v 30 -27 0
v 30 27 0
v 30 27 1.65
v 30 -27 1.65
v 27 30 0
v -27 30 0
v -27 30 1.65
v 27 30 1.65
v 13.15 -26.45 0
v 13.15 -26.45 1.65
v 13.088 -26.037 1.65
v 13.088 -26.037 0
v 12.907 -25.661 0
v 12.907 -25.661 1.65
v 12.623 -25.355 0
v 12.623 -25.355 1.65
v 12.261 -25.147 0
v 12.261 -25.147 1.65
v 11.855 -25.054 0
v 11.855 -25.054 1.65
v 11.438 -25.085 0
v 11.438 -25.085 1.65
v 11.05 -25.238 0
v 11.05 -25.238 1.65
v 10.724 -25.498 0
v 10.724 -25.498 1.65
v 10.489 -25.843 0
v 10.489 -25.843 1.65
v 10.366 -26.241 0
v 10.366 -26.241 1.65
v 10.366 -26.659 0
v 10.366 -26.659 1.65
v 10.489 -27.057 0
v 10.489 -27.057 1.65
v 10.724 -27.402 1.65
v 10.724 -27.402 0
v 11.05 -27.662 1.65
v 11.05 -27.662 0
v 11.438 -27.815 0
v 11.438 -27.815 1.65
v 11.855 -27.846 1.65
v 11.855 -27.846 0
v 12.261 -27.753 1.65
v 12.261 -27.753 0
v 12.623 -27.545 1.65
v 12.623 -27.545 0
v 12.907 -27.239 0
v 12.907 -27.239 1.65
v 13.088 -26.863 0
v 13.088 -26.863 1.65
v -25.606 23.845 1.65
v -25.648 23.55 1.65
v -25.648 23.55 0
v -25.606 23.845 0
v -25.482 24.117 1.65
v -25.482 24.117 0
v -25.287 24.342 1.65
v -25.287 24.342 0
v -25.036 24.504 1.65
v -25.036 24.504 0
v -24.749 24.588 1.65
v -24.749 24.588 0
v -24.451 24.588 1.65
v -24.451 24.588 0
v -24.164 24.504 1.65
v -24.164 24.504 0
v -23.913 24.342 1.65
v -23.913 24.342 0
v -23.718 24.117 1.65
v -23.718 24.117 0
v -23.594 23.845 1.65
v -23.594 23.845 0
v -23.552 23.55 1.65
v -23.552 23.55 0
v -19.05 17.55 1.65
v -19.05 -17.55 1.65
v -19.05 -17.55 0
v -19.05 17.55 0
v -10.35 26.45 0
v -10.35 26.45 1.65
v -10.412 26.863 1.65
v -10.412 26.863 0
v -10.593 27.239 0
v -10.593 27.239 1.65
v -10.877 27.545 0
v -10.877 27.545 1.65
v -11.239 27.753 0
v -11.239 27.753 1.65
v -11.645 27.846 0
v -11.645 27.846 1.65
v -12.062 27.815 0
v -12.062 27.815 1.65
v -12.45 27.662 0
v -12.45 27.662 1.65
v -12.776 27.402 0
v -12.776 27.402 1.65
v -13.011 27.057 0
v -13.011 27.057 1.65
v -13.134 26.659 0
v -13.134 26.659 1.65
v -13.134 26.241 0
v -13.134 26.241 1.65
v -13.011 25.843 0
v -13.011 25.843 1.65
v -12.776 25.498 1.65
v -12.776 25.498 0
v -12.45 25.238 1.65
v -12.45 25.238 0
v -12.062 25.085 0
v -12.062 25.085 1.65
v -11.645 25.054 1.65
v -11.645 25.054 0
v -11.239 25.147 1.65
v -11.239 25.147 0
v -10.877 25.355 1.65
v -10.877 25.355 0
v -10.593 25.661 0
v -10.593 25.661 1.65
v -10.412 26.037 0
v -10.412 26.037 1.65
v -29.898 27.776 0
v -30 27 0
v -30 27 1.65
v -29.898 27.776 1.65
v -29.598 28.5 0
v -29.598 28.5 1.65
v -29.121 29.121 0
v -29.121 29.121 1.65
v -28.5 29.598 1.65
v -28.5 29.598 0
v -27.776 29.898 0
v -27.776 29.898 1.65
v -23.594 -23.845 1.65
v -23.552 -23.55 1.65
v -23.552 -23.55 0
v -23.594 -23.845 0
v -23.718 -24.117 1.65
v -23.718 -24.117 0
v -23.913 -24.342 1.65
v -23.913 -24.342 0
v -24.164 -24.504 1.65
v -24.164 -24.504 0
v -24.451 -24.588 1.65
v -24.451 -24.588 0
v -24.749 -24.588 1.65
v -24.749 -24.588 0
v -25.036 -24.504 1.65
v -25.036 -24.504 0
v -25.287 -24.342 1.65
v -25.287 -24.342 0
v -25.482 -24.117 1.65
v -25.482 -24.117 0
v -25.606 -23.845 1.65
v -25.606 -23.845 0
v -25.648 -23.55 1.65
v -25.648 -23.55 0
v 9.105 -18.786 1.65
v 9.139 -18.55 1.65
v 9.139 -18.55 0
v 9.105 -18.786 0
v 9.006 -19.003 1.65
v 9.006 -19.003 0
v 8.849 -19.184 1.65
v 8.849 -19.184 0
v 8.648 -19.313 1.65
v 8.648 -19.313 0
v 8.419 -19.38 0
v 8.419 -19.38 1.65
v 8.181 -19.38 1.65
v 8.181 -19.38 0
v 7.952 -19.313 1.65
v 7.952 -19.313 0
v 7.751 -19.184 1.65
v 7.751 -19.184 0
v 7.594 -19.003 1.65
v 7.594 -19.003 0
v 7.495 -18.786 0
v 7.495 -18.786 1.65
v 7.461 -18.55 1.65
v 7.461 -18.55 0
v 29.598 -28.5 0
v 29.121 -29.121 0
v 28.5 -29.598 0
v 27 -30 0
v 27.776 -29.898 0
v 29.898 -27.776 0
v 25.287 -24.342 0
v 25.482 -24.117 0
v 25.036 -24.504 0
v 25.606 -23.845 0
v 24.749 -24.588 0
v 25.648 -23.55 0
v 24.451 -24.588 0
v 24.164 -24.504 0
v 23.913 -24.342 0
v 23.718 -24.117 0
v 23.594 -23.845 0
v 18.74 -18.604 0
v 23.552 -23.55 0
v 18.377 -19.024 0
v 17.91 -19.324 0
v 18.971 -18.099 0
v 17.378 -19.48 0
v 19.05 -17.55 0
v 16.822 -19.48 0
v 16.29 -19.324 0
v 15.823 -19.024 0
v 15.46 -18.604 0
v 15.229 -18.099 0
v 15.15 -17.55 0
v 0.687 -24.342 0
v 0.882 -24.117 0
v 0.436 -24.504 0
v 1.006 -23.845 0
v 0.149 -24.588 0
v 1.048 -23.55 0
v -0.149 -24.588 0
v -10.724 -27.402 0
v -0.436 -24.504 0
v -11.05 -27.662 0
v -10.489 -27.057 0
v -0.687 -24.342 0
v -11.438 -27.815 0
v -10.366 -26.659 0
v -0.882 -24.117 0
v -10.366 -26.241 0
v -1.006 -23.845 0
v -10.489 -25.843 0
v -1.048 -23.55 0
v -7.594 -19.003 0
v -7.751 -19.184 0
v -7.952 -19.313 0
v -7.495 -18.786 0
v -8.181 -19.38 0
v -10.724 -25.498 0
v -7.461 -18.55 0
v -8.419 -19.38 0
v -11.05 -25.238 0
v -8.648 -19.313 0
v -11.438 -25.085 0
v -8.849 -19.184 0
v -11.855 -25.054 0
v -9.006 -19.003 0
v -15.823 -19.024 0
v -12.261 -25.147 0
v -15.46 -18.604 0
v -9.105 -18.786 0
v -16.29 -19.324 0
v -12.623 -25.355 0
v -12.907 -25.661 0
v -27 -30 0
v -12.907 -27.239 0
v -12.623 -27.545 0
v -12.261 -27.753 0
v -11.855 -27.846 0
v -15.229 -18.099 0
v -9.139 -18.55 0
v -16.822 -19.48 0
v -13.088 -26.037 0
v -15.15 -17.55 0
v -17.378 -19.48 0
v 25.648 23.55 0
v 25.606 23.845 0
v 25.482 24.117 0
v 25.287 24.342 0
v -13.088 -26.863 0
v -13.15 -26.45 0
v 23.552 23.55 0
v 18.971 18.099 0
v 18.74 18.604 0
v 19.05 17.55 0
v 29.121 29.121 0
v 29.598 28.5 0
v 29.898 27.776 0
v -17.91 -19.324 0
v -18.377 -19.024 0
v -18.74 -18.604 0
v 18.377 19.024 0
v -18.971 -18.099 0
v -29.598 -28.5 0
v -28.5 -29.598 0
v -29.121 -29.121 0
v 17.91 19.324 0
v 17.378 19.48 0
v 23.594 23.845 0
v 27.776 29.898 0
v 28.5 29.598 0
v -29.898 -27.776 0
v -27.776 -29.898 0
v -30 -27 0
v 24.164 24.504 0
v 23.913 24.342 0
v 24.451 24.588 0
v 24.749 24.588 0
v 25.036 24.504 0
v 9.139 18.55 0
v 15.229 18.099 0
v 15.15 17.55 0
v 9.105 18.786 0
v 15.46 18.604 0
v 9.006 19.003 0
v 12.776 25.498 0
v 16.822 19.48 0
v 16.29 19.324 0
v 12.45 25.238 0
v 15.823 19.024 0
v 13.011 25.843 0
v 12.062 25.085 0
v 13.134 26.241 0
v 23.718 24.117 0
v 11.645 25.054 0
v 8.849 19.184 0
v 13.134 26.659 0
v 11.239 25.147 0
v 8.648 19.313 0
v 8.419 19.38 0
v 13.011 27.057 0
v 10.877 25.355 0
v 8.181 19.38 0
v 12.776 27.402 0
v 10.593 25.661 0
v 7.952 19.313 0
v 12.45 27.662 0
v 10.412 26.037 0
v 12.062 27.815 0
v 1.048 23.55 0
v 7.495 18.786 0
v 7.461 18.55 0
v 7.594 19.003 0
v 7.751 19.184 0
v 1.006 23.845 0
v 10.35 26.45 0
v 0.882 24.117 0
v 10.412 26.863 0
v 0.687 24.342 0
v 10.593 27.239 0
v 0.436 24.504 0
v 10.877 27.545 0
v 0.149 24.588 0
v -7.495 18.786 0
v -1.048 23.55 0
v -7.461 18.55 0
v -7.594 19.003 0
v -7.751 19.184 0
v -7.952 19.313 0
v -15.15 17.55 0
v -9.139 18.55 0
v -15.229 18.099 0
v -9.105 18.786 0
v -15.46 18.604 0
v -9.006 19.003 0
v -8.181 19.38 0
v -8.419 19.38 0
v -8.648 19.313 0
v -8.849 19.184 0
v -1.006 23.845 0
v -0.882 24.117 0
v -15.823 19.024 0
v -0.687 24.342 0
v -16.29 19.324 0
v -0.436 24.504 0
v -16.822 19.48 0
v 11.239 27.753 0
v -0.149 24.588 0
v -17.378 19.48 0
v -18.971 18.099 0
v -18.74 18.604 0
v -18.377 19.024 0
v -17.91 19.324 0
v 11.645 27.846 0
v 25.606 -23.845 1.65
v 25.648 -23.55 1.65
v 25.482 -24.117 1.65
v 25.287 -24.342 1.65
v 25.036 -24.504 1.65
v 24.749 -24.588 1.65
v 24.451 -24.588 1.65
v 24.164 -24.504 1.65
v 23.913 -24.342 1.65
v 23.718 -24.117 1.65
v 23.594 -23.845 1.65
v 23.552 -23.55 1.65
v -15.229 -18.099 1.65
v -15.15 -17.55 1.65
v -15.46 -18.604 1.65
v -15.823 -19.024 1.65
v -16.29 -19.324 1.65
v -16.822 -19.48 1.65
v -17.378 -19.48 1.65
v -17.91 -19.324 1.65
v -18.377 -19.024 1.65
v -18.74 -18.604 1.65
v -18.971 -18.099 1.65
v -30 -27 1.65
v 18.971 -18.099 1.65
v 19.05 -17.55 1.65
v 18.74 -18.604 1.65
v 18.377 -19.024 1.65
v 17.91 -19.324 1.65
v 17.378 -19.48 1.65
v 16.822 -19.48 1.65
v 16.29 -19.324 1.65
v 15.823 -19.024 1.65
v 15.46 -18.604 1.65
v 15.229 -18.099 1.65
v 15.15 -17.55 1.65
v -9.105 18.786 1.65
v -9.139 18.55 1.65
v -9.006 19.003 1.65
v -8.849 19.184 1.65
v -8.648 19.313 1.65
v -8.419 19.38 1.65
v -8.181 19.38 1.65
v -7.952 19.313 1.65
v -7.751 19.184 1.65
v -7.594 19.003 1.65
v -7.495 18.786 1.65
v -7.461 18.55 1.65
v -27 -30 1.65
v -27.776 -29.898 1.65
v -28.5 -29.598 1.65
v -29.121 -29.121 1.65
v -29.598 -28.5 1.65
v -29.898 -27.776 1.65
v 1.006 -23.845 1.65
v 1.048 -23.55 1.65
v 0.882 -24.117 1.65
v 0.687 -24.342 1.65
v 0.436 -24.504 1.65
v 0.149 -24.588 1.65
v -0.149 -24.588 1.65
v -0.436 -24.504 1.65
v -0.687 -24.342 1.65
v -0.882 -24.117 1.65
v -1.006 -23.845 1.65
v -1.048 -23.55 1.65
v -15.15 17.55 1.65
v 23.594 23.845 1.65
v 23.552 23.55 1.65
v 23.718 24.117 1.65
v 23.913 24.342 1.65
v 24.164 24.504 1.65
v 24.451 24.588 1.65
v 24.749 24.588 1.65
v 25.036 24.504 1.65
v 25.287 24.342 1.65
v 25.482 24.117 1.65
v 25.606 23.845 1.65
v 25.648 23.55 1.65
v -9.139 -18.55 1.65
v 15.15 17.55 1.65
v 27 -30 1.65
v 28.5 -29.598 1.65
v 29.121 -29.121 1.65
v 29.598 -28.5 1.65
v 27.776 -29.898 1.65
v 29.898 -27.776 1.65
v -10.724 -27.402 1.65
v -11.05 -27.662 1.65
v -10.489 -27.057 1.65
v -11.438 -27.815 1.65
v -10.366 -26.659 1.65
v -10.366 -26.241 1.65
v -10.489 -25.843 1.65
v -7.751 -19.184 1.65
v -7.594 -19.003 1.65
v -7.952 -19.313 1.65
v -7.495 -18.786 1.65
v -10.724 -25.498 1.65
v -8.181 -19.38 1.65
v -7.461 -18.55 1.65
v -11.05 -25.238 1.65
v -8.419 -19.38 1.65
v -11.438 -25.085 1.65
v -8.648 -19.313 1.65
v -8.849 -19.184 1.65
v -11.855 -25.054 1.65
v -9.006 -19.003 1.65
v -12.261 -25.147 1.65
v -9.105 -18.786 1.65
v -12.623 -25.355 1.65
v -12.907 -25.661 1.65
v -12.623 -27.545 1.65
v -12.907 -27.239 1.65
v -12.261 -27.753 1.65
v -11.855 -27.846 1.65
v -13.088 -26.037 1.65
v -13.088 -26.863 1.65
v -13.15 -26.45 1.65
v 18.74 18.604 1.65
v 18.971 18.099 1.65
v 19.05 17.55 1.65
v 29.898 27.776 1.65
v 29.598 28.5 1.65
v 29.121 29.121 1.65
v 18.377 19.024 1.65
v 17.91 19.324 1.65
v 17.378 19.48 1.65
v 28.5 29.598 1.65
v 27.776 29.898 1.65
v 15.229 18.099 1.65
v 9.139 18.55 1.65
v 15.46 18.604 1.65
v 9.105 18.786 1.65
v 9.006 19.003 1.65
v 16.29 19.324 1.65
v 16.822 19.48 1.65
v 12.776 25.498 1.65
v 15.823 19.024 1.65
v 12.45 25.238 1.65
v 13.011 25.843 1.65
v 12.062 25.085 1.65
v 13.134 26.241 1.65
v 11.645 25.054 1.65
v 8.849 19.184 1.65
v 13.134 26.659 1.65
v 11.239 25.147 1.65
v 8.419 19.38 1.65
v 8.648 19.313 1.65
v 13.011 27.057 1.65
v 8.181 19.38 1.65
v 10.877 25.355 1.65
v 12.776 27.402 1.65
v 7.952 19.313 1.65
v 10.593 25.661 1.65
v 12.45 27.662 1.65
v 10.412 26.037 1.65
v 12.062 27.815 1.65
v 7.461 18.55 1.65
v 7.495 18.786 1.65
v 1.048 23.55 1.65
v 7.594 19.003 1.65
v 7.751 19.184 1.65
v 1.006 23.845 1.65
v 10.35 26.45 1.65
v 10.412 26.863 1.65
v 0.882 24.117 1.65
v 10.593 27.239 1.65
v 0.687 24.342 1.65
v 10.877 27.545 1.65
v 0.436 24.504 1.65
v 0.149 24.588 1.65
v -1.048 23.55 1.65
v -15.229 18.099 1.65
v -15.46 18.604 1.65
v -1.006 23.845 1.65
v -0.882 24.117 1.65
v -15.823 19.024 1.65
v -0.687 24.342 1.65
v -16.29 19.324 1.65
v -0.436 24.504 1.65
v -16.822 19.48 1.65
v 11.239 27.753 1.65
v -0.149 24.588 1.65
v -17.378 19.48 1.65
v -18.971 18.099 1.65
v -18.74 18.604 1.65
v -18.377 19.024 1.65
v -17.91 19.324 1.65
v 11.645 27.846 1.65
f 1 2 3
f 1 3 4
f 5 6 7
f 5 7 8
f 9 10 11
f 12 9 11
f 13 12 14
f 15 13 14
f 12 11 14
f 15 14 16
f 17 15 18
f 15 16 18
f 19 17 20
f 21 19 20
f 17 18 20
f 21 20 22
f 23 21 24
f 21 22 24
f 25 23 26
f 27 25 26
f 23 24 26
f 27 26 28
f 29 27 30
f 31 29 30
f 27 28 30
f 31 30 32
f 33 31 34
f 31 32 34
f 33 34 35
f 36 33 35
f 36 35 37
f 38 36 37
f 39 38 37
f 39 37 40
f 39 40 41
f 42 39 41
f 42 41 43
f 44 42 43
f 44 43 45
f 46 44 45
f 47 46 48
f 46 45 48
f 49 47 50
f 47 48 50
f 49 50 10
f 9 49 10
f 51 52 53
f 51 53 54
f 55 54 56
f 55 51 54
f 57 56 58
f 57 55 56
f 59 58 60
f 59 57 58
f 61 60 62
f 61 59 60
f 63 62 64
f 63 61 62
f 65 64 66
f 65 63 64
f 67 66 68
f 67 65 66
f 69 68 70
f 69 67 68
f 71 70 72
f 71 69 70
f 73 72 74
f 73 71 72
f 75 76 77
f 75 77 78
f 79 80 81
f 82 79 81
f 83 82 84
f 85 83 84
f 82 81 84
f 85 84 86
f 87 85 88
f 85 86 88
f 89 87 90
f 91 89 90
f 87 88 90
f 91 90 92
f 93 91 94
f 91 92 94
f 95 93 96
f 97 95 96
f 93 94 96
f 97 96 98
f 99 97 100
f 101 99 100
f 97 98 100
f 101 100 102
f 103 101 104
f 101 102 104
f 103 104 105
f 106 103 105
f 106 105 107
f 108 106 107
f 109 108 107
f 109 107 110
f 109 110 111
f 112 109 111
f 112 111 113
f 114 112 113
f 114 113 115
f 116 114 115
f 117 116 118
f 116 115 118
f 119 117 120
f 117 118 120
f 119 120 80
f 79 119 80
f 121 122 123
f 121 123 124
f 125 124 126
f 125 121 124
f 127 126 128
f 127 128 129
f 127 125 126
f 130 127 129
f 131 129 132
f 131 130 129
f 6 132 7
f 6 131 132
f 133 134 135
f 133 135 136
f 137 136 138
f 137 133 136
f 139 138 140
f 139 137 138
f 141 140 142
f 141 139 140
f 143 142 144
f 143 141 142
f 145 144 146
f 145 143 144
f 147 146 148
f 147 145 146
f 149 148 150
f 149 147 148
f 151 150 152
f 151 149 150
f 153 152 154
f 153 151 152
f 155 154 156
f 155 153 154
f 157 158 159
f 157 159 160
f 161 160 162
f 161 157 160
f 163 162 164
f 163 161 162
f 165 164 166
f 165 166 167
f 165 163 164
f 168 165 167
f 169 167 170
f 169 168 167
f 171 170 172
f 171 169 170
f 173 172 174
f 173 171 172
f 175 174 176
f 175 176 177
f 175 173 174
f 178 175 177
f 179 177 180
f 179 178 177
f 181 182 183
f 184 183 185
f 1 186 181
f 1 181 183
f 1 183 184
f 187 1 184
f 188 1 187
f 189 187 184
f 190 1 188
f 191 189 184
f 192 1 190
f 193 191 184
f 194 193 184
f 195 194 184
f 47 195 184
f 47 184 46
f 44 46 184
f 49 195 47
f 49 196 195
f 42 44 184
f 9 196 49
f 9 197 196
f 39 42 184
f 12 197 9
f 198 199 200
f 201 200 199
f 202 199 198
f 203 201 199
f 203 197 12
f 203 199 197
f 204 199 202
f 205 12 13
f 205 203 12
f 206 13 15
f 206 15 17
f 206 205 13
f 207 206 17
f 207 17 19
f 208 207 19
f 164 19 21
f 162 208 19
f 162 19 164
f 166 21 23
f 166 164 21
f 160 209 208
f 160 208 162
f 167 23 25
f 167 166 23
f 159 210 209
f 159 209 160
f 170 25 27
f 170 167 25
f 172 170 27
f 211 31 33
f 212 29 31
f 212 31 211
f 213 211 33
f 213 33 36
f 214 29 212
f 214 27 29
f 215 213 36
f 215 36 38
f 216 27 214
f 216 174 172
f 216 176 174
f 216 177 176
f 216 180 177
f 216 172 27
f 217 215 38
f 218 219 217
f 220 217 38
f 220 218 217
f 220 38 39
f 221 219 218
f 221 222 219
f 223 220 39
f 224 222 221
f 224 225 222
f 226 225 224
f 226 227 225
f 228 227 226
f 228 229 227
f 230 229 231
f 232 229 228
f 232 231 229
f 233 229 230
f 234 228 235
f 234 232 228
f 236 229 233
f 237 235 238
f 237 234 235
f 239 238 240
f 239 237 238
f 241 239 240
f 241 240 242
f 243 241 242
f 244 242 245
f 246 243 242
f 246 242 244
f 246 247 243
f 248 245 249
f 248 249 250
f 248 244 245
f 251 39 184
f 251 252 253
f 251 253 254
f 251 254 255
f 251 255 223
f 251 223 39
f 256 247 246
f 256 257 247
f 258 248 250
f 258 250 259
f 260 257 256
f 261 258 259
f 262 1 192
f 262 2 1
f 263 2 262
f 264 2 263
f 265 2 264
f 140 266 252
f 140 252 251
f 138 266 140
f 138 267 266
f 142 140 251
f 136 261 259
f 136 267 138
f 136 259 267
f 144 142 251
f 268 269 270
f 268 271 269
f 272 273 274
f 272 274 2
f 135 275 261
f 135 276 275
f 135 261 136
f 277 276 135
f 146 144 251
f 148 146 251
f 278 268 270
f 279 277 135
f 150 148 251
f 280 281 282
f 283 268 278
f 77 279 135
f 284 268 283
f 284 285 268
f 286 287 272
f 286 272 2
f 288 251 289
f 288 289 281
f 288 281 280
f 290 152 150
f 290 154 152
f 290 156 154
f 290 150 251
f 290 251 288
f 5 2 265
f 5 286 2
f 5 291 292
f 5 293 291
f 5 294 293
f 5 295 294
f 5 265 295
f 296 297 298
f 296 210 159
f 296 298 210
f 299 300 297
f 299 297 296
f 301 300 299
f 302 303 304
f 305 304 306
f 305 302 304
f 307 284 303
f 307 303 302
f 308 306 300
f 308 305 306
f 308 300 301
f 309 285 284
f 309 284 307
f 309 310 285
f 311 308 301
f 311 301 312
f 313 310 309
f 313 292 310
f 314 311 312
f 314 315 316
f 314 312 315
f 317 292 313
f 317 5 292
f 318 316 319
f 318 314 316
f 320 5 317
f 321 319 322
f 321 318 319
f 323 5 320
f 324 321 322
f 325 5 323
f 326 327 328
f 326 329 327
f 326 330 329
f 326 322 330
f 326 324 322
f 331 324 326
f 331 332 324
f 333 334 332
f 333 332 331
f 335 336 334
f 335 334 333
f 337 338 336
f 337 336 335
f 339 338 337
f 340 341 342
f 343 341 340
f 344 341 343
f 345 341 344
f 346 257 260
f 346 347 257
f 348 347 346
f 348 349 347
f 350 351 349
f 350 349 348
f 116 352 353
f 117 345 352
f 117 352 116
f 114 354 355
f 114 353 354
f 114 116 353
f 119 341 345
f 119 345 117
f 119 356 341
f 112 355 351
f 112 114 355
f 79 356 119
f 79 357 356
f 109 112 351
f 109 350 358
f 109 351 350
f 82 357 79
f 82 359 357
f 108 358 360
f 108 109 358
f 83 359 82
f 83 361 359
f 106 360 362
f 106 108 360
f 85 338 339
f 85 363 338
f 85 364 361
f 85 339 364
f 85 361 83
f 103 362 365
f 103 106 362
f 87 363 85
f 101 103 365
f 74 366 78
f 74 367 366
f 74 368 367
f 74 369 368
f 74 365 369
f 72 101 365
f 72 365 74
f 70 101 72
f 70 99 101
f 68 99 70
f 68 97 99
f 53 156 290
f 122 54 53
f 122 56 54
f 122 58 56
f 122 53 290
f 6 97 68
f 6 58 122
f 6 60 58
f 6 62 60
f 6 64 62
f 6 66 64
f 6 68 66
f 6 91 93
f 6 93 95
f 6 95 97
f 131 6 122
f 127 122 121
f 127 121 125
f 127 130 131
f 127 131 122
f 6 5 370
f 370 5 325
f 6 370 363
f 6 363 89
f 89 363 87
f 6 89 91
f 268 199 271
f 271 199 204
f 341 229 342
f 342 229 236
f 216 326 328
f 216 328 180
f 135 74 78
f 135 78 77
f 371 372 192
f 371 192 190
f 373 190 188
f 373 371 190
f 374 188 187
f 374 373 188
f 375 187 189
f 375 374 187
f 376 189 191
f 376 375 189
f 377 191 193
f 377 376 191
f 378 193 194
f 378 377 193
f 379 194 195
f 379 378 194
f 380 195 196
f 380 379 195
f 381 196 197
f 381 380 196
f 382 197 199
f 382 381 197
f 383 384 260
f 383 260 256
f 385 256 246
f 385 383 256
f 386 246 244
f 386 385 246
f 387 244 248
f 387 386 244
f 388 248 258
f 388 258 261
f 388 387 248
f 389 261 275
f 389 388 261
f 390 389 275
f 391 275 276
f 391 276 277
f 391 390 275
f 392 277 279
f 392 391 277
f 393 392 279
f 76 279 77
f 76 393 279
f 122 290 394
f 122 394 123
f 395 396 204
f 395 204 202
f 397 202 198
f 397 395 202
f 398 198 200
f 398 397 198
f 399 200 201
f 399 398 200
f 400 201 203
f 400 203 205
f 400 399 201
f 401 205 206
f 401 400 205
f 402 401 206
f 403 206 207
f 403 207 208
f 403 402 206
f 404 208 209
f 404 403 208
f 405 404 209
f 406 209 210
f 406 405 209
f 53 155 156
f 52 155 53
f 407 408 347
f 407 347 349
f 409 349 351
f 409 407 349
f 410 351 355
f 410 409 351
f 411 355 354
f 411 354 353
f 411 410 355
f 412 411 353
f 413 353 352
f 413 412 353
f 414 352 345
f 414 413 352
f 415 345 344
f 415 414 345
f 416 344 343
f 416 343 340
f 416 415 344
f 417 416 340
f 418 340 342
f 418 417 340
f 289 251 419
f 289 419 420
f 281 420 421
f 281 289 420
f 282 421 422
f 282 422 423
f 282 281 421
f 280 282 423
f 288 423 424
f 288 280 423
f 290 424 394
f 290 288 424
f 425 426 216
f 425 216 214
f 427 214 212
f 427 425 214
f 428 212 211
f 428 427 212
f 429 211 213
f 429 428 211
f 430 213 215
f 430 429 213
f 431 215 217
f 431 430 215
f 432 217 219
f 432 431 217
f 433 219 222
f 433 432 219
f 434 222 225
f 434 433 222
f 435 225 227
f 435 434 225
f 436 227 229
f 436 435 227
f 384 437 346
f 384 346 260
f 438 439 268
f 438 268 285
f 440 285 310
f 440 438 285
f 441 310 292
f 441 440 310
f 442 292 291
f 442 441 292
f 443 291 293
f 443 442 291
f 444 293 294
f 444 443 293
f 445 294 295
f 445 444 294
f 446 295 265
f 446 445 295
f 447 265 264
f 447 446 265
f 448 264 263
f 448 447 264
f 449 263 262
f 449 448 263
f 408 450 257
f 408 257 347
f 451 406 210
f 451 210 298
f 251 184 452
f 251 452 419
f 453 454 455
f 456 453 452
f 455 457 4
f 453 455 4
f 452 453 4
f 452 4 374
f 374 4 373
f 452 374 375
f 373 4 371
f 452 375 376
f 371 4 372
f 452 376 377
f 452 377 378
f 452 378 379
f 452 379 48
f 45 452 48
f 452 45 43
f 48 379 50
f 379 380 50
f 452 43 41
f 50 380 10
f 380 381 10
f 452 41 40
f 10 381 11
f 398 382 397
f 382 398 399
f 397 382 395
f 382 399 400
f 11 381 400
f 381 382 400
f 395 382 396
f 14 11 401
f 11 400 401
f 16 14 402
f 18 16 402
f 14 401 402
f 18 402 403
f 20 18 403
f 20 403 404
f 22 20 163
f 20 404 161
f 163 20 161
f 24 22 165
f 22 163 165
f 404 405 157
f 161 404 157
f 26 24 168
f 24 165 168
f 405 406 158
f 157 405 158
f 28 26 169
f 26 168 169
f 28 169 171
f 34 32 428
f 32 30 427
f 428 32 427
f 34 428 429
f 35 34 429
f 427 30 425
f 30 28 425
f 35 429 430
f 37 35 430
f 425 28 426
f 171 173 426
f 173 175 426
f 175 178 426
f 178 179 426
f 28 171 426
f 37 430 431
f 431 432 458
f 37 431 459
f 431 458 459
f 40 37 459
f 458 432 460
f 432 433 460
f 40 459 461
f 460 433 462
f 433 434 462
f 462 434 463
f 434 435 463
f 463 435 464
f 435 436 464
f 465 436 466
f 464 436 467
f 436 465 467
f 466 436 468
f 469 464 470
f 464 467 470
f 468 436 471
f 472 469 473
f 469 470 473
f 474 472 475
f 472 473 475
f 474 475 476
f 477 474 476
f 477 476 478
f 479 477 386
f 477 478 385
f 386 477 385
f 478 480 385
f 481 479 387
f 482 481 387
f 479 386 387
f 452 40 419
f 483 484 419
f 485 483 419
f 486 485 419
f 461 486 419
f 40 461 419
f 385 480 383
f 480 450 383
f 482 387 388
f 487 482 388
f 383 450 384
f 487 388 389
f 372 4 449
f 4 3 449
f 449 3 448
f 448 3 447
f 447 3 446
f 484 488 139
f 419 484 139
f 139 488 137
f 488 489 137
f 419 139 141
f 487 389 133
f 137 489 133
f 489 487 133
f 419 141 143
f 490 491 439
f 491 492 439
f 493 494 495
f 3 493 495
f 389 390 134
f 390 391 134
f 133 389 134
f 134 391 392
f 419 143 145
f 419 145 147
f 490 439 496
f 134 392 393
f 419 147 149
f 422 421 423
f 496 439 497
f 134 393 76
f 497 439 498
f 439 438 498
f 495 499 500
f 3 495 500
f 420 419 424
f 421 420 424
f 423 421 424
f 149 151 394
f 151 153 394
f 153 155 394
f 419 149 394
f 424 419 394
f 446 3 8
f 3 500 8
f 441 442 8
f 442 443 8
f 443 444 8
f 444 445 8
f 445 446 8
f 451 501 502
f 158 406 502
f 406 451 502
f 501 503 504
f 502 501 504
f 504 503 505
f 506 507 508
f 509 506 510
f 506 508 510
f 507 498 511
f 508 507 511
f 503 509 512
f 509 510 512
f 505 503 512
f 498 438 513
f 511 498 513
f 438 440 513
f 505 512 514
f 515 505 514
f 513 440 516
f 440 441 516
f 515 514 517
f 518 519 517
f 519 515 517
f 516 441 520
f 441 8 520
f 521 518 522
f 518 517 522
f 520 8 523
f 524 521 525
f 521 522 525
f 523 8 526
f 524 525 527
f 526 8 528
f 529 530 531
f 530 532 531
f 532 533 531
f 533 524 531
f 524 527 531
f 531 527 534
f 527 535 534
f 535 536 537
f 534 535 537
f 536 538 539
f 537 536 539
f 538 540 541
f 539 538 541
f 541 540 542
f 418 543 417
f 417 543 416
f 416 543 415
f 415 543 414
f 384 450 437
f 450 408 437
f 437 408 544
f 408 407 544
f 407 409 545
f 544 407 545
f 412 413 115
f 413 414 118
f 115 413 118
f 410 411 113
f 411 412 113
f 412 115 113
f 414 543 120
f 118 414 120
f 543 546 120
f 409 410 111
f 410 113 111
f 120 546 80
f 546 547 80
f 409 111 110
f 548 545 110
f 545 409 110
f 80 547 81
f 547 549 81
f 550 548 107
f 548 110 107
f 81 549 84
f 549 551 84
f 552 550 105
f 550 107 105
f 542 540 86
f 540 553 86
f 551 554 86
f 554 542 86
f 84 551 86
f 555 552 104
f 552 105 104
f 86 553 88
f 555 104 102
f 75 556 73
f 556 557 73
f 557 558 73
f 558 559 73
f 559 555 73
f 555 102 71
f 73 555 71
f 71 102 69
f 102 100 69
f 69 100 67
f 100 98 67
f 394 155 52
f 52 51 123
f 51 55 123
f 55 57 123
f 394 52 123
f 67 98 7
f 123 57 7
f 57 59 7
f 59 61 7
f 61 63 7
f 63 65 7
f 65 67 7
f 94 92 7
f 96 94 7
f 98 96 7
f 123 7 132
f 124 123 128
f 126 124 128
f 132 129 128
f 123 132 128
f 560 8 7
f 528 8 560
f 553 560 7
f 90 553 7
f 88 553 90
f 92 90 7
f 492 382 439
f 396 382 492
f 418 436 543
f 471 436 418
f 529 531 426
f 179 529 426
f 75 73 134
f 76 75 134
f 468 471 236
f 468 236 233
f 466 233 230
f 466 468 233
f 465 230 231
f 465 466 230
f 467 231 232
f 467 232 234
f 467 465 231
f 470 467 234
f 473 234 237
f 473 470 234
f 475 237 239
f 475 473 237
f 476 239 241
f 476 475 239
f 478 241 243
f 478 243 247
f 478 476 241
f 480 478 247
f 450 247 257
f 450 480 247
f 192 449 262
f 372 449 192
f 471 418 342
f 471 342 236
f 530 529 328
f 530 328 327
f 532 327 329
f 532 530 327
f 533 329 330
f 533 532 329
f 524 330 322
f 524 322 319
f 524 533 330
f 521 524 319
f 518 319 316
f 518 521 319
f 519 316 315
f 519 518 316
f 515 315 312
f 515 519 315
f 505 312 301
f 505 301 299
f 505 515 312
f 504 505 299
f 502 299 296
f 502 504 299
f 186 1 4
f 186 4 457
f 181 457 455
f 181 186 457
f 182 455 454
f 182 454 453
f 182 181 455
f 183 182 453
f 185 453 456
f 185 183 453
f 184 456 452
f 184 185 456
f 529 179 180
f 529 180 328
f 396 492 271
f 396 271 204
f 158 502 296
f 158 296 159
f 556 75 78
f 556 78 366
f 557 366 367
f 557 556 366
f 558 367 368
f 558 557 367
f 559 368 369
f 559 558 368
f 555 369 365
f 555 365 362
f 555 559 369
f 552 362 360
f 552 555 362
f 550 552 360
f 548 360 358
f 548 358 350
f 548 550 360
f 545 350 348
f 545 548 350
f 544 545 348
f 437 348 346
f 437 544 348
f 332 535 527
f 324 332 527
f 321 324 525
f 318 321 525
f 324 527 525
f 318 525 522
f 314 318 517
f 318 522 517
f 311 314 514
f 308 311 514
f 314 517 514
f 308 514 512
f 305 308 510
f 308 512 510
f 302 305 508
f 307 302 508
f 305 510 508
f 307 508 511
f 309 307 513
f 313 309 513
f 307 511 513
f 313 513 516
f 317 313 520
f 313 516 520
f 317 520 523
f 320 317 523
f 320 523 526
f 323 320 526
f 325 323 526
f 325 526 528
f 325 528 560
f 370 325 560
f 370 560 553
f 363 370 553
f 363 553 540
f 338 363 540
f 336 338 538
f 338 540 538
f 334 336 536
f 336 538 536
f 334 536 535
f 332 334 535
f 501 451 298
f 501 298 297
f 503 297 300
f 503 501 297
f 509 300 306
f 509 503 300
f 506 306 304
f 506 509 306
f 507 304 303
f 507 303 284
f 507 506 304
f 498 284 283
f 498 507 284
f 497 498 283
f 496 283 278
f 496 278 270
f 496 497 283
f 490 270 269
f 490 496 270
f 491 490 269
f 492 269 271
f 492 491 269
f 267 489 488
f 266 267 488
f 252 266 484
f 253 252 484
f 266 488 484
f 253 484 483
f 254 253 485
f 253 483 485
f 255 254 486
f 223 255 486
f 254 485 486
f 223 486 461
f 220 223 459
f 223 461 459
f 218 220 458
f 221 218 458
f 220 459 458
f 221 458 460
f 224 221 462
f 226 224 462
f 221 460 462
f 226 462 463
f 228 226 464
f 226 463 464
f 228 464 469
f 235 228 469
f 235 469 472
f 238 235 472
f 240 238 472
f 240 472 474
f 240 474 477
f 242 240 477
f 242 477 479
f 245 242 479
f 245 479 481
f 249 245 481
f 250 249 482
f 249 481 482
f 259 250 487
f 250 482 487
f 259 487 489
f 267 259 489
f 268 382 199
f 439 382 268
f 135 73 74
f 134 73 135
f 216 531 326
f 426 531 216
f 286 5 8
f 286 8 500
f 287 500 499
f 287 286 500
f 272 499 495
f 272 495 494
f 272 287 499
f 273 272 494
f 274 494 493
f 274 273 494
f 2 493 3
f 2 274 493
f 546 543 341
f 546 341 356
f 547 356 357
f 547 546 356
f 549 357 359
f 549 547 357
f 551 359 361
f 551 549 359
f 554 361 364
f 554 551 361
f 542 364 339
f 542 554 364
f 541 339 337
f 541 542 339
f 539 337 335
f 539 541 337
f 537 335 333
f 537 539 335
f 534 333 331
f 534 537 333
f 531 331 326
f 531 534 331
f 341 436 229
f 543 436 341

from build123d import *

# Parameters (mm, degrees)
BOSS_EXTRUDE1_DEPTH = 1.65
SKETCH2_R           = 1.4
CUT_EXTRUDE1_DEPTH  = 1.65


with BuildPart() as part:
    # Sketch1 → Boss-Extrude1 (new body)
    with BuildSketch(Plane.XY):
        with BuildLine():
            Line((27, -30), (-27, -30))
            ThreePointArc((-27, -30), (-29.121320344, -29.121320344), (-30, -27))
            Line((-30, -27), (-30, 27))
            ThreePointArc((-30, 27), (-29.121320344, 29.121320344), (-27, 30))
            Line((-27, 30), (27, 30))
            ThreePointArc((27, 30), (29.121320344, 29.121320344), (30, 27))
            Line((30, 27), (30, -27))
            ThreePointArc((30, -27), (29.121320344, -29.121320344), (27, -30))
        make_face()
    extrude(amount=BOSS_EXTRUDE1_DEPTH)

    # Sketch2 → Cut-Extrude1 (cut)
    with BuildSketch(Plane.XY.offset(1.65)):
        with Locations((-11.75, 26.45)):
            Circle(SKETCH2_R)
        with Locations(Location((11.75, 26.45, 0), (0, 0, 180))):
            Circle(SKETCH2_R)
        with Locations((11.75, -26.45)):
            Circle(SKETCH2_R)
        with Locations(Location((-11.75, -26.45, 0), (0, 0, 180))):
            Circle(SKETCH2_R)
        with BuildLine():
            Line((23.551533864, -23.55), (23.551533864, 23.55))
            ThreePointArc((23.551533864, 23.55), (24.6, 24.598466136), (25.648466136, 23.55))
            Line((25.648466136, 23.55), (25.648466136, -23.55))
            ThreePointArc((25.648466136, -23.55), (24.6, -24.598466136), (23.551533864, -23.55))
        make_face()
        with BuildLine():
            Line((-1.048466136, -23.55), (-1.048466136, 23.55))
            ThreePointArc((-1.048466136, 23.55), (0, 24.598466136), (1.048466136, 23.55))
            Line((1.048466136, 23.55), (1.048466136, -23.55))
            ThreePointArc((1.048466136, -23.55), (0, -24.598466136), (-1.048466136, -23.55))
        make_face()
        with BuildLine():
            Line((-25.648466136, -23.55), (-25.648466136, 23.55))
            ThreePointArc((-25.648466136, 23.55), (-24.6, 24.598466136), (-23.551533864, 23.55))
            Line((-23.551533864, 23.55), (-23.551533864, -23.55))
            ThreePointArc((-23.551533864, -23.55), (-24.6, -24.598466136), (-25.648466136, -23.55))
        make_face()
        with BuildLine():
            Line((-9.13875967, -18.55), (-9.13875967, 18.55))
            ThreePointArc((-9.13875967, 18.55), (-8.3, 19.38875967), (-7.46124033, 18.55))
            Line((-7.46124033, 18.55), (-7.46124033, -18.55))
            ThreePointArc((-7.46124033, -18.55), (-8.3, -19.38875967), (-9.13875967, -18.55))
        make_face()
        with BuildLine():
            Line((15.15, -17.55), (15.15, 17.55))
            ThreePointArc((15.15, 17.55), (17.1, 19.5), (19.05, 17.55))
            Line((19.05, 17.55), (19.05, -17.55))
            ThreePointArc((19.05, -17.55), (17.1, -19.5), (15.15, -17.55))
        make_face()
        with BuildLine():
            Line((-19.05, -17.55), (-19.05, 17.55))
            ThreePointArc((-19.05, 17.55), (-17.1, 19.5), (-15.15, 17.55))
            Line((-15.15, 17.55), (-15.15, -17.55))
            ThreePointArc((-15.15, -17.55), (-17.1, -19.5), (-19.05, -17.55))
        make_face()
        with BuildLine():
            Line((7.46124033, -18.55), (7.46124033, 18.55))
            ThreePointArc((7.46124033, 18.55), (8.3, 19.38875967), (9.13875967, 18.55))
            Line((9.13875967, 18.55), (9.13875967, -18.55))
            ThreePointArc((9.13875967, -18.55), (8.3, -19.38875967), (7.46124033, -18.55))
        make_face()
    extrude(amount=-CUT_EXTRUDE1_DEPTH, mode=Mode.SUBTRACT)


solid = part.part
